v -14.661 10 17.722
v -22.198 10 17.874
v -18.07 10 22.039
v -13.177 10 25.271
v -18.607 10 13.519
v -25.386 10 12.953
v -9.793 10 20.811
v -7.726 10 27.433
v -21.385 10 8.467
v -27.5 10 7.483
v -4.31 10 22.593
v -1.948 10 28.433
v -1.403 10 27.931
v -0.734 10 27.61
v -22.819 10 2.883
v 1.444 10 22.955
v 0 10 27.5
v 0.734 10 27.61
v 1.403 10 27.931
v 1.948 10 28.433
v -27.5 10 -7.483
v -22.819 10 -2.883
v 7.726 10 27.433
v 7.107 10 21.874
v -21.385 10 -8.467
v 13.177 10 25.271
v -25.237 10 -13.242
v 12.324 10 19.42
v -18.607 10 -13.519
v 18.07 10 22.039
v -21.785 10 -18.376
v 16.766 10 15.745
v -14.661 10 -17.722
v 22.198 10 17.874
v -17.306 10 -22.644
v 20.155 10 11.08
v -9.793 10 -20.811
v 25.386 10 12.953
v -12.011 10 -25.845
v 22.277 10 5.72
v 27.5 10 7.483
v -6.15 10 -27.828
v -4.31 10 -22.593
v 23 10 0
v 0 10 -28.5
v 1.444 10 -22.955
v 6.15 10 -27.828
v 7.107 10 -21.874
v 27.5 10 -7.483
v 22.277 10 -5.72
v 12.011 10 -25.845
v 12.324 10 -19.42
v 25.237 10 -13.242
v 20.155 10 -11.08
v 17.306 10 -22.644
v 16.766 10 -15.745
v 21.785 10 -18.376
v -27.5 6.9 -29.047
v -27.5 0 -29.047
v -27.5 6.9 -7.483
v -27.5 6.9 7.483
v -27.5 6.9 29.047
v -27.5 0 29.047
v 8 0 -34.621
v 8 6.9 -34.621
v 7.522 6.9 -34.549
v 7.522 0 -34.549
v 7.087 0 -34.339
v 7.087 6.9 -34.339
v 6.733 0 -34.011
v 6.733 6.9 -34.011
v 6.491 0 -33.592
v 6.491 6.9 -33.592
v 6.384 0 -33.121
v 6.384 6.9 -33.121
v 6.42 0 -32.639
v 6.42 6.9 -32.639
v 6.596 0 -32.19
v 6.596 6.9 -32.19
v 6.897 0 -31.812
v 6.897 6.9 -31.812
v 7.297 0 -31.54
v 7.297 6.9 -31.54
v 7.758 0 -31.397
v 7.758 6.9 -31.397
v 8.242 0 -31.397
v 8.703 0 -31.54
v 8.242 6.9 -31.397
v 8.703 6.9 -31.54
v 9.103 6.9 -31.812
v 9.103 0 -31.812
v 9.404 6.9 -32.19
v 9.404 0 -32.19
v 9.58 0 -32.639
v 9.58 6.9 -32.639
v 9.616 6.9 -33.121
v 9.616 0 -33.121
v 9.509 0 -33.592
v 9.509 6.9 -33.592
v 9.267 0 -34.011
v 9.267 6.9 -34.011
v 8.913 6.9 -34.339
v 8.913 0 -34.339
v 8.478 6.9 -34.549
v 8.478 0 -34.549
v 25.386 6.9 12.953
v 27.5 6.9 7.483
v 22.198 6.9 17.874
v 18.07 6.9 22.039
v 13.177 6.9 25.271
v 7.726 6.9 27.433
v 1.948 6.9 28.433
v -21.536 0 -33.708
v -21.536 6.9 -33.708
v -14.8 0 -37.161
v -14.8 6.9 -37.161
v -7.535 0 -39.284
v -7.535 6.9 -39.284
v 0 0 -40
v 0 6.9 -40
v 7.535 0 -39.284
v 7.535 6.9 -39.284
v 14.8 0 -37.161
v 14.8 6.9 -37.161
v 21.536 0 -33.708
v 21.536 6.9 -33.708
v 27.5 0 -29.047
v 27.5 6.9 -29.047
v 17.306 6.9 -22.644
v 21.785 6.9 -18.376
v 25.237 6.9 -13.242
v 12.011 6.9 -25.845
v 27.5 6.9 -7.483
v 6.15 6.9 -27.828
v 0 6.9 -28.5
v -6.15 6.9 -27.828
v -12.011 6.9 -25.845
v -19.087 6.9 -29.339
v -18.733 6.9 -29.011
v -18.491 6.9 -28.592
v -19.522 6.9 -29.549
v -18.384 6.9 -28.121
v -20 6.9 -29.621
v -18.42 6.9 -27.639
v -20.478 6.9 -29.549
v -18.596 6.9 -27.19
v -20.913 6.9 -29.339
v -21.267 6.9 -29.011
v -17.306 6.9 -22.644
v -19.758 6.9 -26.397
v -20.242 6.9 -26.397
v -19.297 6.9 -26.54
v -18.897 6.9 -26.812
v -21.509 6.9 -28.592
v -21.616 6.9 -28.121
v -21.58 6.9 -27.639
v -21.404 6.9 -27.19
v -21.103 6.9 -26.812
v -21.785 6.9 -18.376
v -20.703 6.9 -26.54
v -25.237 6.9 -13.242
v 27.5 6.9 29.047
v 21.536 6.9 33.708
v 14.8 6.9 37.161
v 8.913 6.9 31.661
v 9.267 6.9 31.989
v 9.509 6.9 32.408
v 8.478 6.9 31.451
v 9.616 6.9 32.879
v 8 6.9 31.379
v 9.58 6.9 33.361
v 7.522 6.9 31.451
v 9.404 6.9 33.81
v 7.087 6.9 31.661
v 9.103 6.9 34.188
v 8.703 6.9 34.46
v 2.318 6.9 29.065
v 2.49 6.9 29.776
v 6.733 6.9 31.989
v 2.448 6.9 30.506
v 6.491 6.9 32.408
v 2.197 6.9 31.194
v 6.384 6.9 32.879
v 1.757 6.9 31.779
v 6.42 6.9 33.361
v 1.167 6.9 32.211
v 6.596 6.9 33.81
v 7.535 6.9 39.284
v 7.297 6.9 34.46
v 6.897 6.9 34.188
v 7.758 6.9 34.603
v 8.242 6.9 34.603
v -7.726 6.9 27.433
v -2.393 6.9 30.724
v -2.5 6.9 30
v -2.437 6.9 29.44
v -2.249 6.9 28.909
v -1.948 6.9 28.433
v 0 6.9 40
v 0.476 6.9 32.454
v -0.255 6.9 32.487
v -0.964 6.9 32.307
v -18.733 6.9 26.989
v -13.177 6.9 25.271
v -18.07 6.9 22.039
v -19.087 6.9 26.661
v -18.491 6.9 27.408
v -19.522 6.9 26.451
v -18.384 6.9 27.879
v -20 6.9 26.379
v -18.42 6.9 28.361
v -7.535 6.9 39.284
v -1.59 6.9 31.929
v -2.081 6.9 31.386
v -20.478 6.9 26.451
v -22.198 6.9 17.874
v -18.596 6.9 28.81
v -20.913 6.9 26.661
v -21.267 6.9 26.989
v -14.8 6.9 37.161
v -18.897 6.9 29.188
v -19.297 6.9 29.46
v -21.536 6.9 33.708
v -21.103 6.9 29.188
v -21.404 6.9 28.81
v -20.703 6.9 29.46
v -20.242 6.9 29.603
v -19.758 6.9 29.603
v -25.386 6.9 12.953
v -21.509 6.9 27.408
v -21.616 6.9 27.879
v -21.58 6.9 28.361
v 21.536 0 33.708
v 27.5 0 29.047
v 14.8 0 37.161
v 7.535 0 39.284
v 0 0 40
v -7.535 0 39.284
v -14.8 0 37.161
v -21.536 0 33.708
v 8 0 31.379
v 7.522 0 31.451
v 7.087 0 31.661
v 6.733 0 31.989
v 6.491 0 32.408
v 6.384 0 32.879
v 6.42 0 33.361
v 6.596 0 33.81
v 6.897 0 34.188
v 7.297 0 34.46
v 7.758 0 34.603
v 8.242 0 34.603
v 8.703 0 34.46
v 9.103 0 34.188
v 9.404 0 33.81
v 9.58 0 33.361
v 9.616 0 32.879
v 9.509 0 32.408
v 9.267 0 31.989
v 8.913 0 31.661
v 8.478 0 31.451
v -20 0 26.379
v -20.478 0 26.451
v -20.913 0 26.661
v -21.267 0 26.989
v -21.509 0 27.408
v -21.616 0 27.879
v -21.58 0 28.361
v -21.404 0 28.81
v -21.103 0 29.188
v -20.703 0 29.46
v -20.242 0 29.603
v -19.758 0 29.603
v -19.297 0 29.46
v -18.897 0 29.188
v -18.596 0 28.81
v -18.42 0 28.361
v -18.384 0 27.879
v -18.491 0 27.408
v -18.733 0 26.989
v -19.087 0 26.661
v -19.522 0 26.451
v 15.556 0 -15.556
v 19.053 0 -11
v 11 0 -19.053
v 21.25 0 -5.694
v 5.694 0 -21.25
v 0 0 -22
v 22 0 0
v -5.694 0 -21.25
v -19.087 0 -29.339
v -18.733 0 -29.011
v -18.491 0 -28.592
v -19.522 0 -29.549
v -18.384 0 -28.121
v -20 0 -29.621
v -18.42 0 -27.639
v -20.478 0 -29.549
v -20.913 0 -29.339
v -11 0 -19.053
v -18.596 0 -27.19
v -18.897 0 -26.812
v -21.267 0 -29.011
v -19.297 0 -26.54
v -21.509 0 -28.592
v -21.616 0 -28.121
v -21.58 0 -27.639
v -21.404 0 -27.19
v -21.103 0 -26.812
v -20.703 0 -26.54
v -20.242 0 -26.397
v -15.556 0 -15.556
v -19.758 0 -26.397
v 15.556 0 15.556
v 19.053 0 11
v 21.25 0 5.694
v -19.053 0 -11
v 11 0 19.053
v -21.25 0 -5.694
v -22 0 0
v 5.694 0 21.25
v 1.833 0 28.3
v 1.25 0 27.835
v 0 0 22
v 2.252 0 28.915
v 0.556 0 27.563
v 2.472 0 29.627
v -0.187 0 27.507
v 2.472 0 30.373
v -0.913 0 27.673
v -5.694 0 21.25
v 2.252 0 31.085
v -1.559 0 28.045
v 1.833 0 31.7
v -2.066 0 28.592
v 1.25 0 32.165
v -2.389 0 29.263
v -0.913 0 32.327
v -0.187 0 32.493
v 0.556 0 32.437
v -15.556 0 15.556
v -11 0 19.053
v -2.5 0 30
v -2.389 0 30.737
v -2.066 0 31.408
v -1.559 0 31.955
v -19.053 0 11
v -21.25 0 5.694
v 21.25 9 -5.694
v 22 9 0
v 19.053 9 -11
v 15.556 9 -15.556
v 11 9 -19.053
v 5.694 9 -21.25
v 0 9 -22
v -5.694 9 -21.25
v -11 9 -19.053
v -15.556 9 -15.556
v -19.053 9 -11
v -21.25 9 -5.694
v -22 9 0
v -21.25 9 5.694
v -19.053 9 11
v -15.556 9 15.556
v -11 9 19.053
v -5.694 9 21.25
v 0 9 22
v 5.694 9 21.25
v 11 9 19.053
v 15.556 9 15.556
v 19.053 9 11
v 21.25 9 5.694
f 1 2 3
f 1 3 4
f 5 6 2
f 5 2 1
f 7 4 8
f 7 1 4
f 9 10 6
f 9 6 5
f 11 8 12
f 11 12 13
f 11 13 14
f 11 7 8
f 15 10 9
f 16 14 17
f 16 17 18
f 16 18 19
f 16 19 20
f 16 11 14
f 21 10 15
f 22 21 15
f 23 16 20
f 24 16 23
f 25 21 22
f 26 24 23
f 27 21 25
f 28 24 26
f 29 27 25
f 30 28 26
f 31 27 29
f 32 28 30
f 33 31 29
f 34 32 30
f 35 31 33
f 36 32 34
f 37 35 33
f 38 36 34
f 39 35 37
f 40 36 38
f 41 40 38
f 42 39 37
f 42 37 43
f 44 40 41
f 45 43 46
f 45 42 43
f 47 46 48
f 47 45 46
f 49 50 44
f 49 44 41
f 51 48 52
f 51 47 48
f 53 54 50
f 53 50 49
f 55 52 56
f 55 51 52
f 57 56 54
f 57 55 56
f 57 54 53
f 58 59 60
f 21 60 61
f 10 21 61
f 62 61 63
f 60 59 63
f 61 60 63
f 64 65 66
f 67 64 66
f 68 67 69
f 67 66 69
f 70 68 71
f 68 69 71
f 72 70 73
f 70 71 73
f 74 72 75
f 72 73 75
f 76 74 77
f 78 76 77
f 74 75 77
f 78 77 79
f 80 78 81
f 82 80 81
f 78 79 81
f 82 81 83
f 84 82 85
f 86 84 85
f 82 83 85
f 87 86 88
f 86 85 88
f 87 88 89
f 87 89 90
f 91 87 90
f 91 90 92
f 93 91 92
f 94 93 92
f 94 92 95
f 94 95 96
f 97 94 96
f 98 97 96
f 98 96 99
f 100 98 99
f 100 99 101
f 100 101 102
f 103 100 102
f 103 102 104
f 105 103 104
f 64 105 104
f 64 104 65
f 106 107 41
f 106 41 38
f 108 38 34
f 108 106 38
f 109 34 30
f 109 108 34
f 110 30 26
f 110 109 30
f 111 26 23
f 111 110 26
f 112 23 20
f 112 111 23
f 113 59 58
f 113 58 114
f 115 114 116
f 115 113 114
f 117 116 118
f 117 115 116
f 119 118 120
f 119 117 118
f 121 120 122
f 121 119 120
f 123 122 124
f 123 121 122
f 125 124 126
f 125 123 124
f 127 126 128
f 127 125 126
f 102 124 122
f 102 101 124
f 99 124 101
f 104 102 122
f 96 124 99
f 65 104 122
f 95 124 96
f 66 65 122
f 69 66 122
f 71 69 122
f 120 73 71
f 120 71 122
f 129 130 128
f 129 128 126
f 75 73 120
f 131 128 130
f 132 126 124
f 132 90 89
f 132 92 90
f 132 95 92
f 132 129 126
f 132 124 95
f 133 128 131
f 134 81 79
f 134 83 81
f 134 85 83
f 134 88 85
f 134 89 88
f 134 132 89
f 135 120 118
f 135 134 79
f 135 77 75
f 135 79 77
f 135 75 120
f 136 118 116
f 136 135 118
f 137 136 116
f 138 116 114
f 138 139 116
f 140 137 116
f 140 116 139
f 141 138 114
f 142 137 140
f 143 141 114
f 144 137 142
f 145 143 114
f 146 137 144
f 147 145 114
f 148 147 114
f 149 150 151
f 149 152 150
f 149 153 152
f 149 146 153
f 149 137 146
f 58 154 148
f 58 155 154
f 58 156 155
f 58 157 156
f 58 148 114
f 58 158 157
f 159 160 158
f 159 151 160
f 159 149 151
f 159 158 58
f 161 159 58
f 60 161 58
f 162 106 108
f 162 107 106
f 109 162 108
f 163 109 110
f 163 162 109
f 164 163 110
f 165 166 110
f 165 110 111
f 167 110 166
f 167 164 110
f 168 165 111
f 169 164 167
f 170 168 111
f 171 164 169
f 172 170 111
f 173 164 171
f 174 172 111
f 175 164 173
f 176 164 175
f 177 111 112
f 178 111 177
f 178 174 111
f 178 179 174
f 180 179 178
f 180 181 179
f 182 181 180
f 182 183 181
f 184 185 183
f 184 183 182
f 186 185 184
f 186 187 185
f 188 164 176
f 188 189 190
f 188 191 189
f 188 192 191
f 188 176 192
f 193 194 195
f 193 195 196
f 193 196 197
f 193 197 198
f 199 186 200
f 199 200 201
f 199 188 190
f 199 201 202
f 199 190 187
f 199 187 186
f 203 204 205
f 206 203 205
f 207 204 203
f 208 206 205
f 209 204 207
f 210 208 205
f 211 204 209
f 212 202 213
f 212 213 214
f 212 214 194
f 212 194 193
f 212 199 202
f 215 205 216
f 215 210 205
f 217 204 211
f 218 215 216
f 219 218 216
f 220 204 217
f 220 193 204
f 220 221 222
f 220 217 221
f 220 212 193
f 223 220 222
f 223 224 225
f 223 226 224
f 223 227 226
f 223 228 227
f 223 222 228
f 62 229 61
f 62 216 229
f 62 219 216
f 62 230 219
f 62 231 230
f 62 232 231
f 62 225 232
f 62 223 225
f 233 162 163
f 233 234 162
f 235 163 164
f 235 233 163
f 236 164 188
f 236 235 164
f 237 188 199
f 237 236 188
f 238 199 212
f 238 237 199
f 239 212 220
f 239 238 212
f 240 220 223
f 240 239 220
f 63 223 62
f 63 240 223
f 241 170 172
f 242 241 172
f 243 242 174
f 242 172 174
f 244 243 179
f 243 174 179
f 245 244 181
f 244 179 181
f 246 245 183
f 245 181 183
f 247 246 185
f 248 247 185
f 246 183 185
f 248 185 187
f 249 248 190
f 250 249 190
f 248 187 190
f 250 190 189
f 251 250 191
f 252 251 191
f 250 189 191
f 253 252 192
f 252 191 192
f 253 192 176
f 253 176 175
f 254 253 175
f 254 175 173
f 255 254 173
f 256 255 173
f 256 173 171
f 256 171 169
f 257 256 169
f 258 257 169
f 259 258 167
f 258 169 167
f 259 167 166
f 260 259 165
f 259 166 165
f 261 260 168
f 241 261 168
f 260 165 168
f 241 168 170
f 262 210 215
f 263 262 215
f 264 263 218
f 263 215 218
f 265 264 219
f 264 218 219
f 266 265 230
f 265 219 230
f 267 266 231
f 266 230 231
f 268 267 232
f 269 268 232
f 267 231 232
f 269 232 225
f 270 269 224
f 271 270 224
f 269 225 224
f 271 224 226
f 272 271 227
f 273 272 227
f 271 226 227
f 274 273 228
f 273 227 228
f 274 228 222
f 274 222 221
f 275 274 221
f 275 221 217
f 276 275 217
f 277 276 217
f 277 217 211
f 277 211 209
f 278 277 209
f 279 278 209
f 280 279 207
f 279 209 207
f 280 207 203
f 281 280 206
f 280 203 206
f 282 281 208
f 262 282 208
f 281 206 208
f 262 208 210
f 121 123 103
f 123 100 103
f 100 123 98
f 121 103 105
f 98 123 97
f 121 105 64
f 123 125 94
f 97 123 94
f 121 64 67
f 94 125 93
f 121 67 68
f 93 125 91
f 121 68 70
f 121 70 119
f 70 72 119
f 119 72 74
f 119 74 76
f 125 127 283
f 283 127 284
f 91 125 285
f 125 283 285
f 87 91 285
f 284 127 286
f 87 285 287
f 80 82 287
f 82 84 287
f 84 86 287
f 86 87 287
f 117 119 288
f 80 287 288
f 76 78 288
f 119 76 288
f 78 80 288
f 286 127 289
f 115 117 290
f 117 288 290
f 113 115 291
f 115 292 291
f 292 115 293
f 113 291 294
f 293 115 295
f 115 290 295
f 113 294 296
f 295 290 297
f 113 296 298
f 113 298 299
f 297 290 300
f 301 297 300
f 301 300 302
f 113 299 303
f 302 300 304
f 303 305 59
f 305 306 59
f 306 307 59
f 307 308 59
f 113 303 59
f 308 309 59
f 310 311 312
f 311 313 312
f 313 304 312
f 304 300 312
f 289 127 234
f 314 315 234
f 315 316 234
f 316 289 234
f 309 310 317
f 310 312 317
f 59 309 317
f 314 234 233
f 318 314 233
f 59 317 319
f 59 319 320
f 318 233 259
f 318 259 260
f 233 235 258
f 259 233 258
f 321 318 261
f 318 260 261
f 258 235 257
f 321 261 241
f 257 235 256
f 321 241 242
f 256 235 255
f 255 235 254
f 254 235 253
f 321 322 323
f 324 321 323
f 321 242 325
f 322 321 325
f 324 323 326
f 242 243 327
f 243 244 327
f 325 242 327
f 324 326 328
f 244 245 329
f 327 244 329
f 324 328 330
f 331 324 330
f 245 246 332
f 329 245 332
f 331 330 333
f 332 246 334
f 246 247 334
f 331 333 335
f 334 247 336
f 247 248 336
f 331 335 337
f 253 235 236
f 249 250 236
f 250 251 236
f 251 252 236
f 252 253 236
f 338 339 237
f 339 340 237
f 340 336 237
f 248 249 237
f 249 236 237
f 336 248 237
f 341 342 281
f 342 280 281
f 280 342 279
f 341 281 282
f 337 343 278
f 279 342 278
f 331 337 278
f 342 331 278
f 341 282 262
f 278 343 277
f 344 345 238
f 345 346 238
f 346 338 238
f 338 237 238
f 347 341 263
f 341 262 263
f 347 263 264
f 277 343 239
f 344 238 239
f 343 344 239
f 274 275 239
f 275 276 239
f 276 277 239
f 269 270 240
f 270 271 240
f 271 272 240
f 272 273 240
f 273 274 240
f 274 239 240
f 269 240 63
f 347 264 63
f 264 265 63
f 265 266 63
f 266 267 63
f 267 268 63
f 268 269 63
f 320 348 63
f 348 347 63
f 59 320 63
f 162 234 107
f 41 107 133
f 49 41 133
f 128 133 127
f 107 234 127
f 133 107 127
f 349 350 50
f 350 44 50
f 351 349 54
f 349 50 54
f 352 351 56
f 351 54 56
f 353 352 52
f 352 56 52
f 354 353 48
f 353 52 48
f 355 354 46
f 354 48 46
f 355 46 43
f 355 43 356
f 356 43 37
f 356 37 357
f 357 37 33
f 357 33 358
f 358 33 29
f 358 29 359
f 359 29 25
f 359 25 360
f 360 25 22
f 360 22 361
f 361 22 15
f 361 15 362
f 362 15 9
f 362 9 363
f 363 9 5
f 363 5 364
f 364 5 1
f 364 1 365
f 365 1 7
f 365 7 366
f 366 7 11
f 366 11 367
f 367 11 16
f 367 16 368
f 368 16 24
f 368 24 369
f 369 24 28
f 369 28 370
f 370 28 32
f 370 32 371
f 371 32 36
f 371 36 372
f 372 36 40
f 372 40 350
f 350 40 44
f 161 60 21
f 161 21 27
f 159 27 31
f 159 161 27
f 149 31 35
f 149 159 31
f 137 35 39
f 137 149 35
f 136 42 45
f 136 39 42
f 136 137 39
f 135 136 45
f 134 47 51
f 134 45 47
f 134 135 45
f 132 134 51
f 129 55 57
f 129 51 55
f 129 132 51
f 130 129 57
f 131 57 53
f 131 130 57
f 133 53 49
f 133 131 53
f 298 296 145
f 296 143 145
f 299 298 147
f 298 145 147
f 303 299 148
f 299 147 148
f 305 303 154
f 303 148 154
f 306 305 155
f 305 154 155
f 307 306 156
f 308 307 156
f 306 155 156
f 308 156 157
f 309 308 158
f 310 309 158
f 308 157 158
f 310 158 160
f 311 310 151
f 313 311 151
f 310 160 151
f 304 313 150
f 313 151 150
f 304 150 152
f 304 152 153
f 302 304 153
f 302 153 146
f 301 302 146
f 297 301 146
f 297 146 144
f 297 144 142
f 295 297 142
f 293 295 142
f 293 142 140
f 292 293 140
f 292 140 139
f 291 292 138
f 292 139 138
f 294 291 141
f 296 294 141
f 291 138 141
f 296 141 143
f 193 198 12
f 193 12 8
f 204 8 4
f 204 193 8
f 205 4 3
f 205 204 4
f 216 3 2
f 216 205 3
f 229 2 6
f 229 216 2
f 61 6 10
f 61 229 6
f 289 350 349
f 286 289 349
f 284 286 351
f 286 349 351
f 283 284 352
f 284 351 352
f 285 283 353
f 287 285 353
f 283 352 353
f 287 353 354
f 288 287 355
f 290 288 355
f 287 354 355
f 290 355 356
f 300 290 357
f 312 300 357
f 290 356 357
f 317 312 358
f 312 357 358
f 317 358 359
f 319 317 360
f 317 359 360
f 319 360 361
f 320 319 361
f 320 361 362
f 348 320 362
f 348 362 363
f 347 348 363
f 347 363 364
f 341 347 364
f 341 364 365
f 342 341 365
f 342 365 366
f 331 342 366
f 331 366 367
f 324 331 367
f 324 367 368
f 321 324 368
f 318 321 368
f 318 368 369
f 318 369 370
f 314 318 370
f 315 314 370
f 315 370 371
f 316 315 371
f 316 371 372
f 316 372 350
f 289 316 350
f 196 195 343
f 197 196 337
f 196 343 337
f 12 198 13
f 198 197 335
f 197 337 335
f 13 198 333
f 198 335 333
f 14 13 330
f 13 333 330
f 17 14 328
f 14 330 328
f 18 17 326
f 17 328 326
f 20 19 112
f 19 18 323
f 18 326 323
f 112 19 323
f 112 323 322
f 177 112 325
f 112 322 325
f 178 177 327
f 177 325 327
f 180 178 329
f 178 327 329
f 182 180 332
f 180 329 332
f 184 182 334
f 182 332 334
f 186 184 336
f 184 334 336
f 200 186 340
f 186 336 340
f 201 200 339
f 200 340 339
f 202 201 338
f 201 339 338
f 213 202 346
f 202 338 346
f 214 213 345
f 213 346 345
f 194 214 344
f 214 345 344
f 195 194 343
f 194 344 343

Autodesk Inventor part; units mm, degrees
ref_plane "YZ Plane" through (0, 0, 0) normal (1, 0, 0) x (0, 1, 0)
ref_plane "XZ Plane" through (0, 0, 0) normal (0, 1, 0) x (-1, 0, 0)
ref_plane "XY Plane" through (0, 0, 0) normal (0, 0, 1) x (1, 0, 0)
sketch "Skizze1" plane through (0, 0, 0) normal (0, 1, 0) x (-1, 0, 0)
  line L0 (-27.5, 29.0474) -> (-27.5, -29.0474)
  line L1 (27.5, -29.0474) -> (27.5, 29.0474)
  arc A0 (27.5, 29.0474) -> (-27.5, 29.0474) centre (0, 0) ccw
  arc A1 (-27.5, -29.0474) -> (27.5, -29.0474) centre (0, 0) ccw
  dimension "d4" = 27.5
  dimension "d5" = 40
extrude "Basebody 1" add sketch "Skizze1" along normal blind 6.9
sketch "Skizze2" plane through (0, 6.9, 0) normal (0, 1, 0) x (1, 0, 0)
  line L0 (-27.5, 29.0474) -> (-27.5, -29.0474) projected
  arc A0 (27.5, 29.0474) -> (-27.5, 29.0474) centre (0, 0) ccw projected
  line L1 (-27.5, -7.4833) -> (-27.5, 7.4833)
  arc A1 (-27.5, -29.0474) -> (27.5, -29.0474) centre (0, 0) ccw projected
  line L2 (27.5, -7.4833) -> (27.5, 7.4833)
  arc A2 (-27.5, -7.4833) -> (27.5, -7.4833) centre (0, 0) ccw
  arc A3 (27.5, 7.4833) -> (-27.5, 7.4833) centre (0, 0) ccw
extrude "Basebody 2" add sketch "Skizze2" along normal blind 3.1
sketch "Skizze3" plane through (0, 10, 0) normal (0, 1, 0) x (1, 0, 0)
  arc A0 (27.5, 29.0474) -> (-27.5, 29.0474) centre (0, 0) ccw projected
  circle A1 centre (0, 0) radius 22
  dimension "d11" = 44
extrude "44H7 Drill" cut sketch "Skizze3" against normal through all
sketch "Skizze4" plane through (0, 0, 0) normal (0, 1, 0) x (-1, 0, 0)
  circle A0 centre (0, 30) radius 2.5
  arc A1 (27.5, 7.4833) -> (-27.5, 7.4833) centre (0, 0) ccw projected
  dimension "d14" = 30
  dimension "d15" = 5
extrude "5H7 Drill" cut sketch "Skizze4" along normal through all
sketch "Skizze6" plane through (0, 0, 0) normal (0, 1, 0) x (-1, 0, 0)
  circle A0 centre (20, 28) radius 2
  line L0 (-27.5, 29.0474) -> (-27.5, -29.0474) projected
  circle A1 centre (-8, 33) radius 2
  line L1 (32.1852, 0) -> (-31.2523, 0)
  circle A2 centre (20, -28) radius 2
  circle A3 centre (-8, -33) radius 2
  point P0 (0, 0)
  dimension "d18" = 4
  dimension "d19" = 28
  dimension "d20" = 47.5
  dimension "d21" = 4
  dimension "d22" = 33
  dimension "d23" = 19.5
hole "M4" at (8, 0, 33) at (-20, 0, 28) at (-20, 0, -28) at (8, 0, -33) direction (0, 1, 0) diameter 3.242 end through all thread size "M4x0.7" class "6H" standard "ISO Metric profile"
chamfer "Fasen2" distance 1 angle 45 1 edges at (-22, 10, 0)
properties part number "27-30-400 Bearing, Housing Measuring Head" material "Aluminium"
